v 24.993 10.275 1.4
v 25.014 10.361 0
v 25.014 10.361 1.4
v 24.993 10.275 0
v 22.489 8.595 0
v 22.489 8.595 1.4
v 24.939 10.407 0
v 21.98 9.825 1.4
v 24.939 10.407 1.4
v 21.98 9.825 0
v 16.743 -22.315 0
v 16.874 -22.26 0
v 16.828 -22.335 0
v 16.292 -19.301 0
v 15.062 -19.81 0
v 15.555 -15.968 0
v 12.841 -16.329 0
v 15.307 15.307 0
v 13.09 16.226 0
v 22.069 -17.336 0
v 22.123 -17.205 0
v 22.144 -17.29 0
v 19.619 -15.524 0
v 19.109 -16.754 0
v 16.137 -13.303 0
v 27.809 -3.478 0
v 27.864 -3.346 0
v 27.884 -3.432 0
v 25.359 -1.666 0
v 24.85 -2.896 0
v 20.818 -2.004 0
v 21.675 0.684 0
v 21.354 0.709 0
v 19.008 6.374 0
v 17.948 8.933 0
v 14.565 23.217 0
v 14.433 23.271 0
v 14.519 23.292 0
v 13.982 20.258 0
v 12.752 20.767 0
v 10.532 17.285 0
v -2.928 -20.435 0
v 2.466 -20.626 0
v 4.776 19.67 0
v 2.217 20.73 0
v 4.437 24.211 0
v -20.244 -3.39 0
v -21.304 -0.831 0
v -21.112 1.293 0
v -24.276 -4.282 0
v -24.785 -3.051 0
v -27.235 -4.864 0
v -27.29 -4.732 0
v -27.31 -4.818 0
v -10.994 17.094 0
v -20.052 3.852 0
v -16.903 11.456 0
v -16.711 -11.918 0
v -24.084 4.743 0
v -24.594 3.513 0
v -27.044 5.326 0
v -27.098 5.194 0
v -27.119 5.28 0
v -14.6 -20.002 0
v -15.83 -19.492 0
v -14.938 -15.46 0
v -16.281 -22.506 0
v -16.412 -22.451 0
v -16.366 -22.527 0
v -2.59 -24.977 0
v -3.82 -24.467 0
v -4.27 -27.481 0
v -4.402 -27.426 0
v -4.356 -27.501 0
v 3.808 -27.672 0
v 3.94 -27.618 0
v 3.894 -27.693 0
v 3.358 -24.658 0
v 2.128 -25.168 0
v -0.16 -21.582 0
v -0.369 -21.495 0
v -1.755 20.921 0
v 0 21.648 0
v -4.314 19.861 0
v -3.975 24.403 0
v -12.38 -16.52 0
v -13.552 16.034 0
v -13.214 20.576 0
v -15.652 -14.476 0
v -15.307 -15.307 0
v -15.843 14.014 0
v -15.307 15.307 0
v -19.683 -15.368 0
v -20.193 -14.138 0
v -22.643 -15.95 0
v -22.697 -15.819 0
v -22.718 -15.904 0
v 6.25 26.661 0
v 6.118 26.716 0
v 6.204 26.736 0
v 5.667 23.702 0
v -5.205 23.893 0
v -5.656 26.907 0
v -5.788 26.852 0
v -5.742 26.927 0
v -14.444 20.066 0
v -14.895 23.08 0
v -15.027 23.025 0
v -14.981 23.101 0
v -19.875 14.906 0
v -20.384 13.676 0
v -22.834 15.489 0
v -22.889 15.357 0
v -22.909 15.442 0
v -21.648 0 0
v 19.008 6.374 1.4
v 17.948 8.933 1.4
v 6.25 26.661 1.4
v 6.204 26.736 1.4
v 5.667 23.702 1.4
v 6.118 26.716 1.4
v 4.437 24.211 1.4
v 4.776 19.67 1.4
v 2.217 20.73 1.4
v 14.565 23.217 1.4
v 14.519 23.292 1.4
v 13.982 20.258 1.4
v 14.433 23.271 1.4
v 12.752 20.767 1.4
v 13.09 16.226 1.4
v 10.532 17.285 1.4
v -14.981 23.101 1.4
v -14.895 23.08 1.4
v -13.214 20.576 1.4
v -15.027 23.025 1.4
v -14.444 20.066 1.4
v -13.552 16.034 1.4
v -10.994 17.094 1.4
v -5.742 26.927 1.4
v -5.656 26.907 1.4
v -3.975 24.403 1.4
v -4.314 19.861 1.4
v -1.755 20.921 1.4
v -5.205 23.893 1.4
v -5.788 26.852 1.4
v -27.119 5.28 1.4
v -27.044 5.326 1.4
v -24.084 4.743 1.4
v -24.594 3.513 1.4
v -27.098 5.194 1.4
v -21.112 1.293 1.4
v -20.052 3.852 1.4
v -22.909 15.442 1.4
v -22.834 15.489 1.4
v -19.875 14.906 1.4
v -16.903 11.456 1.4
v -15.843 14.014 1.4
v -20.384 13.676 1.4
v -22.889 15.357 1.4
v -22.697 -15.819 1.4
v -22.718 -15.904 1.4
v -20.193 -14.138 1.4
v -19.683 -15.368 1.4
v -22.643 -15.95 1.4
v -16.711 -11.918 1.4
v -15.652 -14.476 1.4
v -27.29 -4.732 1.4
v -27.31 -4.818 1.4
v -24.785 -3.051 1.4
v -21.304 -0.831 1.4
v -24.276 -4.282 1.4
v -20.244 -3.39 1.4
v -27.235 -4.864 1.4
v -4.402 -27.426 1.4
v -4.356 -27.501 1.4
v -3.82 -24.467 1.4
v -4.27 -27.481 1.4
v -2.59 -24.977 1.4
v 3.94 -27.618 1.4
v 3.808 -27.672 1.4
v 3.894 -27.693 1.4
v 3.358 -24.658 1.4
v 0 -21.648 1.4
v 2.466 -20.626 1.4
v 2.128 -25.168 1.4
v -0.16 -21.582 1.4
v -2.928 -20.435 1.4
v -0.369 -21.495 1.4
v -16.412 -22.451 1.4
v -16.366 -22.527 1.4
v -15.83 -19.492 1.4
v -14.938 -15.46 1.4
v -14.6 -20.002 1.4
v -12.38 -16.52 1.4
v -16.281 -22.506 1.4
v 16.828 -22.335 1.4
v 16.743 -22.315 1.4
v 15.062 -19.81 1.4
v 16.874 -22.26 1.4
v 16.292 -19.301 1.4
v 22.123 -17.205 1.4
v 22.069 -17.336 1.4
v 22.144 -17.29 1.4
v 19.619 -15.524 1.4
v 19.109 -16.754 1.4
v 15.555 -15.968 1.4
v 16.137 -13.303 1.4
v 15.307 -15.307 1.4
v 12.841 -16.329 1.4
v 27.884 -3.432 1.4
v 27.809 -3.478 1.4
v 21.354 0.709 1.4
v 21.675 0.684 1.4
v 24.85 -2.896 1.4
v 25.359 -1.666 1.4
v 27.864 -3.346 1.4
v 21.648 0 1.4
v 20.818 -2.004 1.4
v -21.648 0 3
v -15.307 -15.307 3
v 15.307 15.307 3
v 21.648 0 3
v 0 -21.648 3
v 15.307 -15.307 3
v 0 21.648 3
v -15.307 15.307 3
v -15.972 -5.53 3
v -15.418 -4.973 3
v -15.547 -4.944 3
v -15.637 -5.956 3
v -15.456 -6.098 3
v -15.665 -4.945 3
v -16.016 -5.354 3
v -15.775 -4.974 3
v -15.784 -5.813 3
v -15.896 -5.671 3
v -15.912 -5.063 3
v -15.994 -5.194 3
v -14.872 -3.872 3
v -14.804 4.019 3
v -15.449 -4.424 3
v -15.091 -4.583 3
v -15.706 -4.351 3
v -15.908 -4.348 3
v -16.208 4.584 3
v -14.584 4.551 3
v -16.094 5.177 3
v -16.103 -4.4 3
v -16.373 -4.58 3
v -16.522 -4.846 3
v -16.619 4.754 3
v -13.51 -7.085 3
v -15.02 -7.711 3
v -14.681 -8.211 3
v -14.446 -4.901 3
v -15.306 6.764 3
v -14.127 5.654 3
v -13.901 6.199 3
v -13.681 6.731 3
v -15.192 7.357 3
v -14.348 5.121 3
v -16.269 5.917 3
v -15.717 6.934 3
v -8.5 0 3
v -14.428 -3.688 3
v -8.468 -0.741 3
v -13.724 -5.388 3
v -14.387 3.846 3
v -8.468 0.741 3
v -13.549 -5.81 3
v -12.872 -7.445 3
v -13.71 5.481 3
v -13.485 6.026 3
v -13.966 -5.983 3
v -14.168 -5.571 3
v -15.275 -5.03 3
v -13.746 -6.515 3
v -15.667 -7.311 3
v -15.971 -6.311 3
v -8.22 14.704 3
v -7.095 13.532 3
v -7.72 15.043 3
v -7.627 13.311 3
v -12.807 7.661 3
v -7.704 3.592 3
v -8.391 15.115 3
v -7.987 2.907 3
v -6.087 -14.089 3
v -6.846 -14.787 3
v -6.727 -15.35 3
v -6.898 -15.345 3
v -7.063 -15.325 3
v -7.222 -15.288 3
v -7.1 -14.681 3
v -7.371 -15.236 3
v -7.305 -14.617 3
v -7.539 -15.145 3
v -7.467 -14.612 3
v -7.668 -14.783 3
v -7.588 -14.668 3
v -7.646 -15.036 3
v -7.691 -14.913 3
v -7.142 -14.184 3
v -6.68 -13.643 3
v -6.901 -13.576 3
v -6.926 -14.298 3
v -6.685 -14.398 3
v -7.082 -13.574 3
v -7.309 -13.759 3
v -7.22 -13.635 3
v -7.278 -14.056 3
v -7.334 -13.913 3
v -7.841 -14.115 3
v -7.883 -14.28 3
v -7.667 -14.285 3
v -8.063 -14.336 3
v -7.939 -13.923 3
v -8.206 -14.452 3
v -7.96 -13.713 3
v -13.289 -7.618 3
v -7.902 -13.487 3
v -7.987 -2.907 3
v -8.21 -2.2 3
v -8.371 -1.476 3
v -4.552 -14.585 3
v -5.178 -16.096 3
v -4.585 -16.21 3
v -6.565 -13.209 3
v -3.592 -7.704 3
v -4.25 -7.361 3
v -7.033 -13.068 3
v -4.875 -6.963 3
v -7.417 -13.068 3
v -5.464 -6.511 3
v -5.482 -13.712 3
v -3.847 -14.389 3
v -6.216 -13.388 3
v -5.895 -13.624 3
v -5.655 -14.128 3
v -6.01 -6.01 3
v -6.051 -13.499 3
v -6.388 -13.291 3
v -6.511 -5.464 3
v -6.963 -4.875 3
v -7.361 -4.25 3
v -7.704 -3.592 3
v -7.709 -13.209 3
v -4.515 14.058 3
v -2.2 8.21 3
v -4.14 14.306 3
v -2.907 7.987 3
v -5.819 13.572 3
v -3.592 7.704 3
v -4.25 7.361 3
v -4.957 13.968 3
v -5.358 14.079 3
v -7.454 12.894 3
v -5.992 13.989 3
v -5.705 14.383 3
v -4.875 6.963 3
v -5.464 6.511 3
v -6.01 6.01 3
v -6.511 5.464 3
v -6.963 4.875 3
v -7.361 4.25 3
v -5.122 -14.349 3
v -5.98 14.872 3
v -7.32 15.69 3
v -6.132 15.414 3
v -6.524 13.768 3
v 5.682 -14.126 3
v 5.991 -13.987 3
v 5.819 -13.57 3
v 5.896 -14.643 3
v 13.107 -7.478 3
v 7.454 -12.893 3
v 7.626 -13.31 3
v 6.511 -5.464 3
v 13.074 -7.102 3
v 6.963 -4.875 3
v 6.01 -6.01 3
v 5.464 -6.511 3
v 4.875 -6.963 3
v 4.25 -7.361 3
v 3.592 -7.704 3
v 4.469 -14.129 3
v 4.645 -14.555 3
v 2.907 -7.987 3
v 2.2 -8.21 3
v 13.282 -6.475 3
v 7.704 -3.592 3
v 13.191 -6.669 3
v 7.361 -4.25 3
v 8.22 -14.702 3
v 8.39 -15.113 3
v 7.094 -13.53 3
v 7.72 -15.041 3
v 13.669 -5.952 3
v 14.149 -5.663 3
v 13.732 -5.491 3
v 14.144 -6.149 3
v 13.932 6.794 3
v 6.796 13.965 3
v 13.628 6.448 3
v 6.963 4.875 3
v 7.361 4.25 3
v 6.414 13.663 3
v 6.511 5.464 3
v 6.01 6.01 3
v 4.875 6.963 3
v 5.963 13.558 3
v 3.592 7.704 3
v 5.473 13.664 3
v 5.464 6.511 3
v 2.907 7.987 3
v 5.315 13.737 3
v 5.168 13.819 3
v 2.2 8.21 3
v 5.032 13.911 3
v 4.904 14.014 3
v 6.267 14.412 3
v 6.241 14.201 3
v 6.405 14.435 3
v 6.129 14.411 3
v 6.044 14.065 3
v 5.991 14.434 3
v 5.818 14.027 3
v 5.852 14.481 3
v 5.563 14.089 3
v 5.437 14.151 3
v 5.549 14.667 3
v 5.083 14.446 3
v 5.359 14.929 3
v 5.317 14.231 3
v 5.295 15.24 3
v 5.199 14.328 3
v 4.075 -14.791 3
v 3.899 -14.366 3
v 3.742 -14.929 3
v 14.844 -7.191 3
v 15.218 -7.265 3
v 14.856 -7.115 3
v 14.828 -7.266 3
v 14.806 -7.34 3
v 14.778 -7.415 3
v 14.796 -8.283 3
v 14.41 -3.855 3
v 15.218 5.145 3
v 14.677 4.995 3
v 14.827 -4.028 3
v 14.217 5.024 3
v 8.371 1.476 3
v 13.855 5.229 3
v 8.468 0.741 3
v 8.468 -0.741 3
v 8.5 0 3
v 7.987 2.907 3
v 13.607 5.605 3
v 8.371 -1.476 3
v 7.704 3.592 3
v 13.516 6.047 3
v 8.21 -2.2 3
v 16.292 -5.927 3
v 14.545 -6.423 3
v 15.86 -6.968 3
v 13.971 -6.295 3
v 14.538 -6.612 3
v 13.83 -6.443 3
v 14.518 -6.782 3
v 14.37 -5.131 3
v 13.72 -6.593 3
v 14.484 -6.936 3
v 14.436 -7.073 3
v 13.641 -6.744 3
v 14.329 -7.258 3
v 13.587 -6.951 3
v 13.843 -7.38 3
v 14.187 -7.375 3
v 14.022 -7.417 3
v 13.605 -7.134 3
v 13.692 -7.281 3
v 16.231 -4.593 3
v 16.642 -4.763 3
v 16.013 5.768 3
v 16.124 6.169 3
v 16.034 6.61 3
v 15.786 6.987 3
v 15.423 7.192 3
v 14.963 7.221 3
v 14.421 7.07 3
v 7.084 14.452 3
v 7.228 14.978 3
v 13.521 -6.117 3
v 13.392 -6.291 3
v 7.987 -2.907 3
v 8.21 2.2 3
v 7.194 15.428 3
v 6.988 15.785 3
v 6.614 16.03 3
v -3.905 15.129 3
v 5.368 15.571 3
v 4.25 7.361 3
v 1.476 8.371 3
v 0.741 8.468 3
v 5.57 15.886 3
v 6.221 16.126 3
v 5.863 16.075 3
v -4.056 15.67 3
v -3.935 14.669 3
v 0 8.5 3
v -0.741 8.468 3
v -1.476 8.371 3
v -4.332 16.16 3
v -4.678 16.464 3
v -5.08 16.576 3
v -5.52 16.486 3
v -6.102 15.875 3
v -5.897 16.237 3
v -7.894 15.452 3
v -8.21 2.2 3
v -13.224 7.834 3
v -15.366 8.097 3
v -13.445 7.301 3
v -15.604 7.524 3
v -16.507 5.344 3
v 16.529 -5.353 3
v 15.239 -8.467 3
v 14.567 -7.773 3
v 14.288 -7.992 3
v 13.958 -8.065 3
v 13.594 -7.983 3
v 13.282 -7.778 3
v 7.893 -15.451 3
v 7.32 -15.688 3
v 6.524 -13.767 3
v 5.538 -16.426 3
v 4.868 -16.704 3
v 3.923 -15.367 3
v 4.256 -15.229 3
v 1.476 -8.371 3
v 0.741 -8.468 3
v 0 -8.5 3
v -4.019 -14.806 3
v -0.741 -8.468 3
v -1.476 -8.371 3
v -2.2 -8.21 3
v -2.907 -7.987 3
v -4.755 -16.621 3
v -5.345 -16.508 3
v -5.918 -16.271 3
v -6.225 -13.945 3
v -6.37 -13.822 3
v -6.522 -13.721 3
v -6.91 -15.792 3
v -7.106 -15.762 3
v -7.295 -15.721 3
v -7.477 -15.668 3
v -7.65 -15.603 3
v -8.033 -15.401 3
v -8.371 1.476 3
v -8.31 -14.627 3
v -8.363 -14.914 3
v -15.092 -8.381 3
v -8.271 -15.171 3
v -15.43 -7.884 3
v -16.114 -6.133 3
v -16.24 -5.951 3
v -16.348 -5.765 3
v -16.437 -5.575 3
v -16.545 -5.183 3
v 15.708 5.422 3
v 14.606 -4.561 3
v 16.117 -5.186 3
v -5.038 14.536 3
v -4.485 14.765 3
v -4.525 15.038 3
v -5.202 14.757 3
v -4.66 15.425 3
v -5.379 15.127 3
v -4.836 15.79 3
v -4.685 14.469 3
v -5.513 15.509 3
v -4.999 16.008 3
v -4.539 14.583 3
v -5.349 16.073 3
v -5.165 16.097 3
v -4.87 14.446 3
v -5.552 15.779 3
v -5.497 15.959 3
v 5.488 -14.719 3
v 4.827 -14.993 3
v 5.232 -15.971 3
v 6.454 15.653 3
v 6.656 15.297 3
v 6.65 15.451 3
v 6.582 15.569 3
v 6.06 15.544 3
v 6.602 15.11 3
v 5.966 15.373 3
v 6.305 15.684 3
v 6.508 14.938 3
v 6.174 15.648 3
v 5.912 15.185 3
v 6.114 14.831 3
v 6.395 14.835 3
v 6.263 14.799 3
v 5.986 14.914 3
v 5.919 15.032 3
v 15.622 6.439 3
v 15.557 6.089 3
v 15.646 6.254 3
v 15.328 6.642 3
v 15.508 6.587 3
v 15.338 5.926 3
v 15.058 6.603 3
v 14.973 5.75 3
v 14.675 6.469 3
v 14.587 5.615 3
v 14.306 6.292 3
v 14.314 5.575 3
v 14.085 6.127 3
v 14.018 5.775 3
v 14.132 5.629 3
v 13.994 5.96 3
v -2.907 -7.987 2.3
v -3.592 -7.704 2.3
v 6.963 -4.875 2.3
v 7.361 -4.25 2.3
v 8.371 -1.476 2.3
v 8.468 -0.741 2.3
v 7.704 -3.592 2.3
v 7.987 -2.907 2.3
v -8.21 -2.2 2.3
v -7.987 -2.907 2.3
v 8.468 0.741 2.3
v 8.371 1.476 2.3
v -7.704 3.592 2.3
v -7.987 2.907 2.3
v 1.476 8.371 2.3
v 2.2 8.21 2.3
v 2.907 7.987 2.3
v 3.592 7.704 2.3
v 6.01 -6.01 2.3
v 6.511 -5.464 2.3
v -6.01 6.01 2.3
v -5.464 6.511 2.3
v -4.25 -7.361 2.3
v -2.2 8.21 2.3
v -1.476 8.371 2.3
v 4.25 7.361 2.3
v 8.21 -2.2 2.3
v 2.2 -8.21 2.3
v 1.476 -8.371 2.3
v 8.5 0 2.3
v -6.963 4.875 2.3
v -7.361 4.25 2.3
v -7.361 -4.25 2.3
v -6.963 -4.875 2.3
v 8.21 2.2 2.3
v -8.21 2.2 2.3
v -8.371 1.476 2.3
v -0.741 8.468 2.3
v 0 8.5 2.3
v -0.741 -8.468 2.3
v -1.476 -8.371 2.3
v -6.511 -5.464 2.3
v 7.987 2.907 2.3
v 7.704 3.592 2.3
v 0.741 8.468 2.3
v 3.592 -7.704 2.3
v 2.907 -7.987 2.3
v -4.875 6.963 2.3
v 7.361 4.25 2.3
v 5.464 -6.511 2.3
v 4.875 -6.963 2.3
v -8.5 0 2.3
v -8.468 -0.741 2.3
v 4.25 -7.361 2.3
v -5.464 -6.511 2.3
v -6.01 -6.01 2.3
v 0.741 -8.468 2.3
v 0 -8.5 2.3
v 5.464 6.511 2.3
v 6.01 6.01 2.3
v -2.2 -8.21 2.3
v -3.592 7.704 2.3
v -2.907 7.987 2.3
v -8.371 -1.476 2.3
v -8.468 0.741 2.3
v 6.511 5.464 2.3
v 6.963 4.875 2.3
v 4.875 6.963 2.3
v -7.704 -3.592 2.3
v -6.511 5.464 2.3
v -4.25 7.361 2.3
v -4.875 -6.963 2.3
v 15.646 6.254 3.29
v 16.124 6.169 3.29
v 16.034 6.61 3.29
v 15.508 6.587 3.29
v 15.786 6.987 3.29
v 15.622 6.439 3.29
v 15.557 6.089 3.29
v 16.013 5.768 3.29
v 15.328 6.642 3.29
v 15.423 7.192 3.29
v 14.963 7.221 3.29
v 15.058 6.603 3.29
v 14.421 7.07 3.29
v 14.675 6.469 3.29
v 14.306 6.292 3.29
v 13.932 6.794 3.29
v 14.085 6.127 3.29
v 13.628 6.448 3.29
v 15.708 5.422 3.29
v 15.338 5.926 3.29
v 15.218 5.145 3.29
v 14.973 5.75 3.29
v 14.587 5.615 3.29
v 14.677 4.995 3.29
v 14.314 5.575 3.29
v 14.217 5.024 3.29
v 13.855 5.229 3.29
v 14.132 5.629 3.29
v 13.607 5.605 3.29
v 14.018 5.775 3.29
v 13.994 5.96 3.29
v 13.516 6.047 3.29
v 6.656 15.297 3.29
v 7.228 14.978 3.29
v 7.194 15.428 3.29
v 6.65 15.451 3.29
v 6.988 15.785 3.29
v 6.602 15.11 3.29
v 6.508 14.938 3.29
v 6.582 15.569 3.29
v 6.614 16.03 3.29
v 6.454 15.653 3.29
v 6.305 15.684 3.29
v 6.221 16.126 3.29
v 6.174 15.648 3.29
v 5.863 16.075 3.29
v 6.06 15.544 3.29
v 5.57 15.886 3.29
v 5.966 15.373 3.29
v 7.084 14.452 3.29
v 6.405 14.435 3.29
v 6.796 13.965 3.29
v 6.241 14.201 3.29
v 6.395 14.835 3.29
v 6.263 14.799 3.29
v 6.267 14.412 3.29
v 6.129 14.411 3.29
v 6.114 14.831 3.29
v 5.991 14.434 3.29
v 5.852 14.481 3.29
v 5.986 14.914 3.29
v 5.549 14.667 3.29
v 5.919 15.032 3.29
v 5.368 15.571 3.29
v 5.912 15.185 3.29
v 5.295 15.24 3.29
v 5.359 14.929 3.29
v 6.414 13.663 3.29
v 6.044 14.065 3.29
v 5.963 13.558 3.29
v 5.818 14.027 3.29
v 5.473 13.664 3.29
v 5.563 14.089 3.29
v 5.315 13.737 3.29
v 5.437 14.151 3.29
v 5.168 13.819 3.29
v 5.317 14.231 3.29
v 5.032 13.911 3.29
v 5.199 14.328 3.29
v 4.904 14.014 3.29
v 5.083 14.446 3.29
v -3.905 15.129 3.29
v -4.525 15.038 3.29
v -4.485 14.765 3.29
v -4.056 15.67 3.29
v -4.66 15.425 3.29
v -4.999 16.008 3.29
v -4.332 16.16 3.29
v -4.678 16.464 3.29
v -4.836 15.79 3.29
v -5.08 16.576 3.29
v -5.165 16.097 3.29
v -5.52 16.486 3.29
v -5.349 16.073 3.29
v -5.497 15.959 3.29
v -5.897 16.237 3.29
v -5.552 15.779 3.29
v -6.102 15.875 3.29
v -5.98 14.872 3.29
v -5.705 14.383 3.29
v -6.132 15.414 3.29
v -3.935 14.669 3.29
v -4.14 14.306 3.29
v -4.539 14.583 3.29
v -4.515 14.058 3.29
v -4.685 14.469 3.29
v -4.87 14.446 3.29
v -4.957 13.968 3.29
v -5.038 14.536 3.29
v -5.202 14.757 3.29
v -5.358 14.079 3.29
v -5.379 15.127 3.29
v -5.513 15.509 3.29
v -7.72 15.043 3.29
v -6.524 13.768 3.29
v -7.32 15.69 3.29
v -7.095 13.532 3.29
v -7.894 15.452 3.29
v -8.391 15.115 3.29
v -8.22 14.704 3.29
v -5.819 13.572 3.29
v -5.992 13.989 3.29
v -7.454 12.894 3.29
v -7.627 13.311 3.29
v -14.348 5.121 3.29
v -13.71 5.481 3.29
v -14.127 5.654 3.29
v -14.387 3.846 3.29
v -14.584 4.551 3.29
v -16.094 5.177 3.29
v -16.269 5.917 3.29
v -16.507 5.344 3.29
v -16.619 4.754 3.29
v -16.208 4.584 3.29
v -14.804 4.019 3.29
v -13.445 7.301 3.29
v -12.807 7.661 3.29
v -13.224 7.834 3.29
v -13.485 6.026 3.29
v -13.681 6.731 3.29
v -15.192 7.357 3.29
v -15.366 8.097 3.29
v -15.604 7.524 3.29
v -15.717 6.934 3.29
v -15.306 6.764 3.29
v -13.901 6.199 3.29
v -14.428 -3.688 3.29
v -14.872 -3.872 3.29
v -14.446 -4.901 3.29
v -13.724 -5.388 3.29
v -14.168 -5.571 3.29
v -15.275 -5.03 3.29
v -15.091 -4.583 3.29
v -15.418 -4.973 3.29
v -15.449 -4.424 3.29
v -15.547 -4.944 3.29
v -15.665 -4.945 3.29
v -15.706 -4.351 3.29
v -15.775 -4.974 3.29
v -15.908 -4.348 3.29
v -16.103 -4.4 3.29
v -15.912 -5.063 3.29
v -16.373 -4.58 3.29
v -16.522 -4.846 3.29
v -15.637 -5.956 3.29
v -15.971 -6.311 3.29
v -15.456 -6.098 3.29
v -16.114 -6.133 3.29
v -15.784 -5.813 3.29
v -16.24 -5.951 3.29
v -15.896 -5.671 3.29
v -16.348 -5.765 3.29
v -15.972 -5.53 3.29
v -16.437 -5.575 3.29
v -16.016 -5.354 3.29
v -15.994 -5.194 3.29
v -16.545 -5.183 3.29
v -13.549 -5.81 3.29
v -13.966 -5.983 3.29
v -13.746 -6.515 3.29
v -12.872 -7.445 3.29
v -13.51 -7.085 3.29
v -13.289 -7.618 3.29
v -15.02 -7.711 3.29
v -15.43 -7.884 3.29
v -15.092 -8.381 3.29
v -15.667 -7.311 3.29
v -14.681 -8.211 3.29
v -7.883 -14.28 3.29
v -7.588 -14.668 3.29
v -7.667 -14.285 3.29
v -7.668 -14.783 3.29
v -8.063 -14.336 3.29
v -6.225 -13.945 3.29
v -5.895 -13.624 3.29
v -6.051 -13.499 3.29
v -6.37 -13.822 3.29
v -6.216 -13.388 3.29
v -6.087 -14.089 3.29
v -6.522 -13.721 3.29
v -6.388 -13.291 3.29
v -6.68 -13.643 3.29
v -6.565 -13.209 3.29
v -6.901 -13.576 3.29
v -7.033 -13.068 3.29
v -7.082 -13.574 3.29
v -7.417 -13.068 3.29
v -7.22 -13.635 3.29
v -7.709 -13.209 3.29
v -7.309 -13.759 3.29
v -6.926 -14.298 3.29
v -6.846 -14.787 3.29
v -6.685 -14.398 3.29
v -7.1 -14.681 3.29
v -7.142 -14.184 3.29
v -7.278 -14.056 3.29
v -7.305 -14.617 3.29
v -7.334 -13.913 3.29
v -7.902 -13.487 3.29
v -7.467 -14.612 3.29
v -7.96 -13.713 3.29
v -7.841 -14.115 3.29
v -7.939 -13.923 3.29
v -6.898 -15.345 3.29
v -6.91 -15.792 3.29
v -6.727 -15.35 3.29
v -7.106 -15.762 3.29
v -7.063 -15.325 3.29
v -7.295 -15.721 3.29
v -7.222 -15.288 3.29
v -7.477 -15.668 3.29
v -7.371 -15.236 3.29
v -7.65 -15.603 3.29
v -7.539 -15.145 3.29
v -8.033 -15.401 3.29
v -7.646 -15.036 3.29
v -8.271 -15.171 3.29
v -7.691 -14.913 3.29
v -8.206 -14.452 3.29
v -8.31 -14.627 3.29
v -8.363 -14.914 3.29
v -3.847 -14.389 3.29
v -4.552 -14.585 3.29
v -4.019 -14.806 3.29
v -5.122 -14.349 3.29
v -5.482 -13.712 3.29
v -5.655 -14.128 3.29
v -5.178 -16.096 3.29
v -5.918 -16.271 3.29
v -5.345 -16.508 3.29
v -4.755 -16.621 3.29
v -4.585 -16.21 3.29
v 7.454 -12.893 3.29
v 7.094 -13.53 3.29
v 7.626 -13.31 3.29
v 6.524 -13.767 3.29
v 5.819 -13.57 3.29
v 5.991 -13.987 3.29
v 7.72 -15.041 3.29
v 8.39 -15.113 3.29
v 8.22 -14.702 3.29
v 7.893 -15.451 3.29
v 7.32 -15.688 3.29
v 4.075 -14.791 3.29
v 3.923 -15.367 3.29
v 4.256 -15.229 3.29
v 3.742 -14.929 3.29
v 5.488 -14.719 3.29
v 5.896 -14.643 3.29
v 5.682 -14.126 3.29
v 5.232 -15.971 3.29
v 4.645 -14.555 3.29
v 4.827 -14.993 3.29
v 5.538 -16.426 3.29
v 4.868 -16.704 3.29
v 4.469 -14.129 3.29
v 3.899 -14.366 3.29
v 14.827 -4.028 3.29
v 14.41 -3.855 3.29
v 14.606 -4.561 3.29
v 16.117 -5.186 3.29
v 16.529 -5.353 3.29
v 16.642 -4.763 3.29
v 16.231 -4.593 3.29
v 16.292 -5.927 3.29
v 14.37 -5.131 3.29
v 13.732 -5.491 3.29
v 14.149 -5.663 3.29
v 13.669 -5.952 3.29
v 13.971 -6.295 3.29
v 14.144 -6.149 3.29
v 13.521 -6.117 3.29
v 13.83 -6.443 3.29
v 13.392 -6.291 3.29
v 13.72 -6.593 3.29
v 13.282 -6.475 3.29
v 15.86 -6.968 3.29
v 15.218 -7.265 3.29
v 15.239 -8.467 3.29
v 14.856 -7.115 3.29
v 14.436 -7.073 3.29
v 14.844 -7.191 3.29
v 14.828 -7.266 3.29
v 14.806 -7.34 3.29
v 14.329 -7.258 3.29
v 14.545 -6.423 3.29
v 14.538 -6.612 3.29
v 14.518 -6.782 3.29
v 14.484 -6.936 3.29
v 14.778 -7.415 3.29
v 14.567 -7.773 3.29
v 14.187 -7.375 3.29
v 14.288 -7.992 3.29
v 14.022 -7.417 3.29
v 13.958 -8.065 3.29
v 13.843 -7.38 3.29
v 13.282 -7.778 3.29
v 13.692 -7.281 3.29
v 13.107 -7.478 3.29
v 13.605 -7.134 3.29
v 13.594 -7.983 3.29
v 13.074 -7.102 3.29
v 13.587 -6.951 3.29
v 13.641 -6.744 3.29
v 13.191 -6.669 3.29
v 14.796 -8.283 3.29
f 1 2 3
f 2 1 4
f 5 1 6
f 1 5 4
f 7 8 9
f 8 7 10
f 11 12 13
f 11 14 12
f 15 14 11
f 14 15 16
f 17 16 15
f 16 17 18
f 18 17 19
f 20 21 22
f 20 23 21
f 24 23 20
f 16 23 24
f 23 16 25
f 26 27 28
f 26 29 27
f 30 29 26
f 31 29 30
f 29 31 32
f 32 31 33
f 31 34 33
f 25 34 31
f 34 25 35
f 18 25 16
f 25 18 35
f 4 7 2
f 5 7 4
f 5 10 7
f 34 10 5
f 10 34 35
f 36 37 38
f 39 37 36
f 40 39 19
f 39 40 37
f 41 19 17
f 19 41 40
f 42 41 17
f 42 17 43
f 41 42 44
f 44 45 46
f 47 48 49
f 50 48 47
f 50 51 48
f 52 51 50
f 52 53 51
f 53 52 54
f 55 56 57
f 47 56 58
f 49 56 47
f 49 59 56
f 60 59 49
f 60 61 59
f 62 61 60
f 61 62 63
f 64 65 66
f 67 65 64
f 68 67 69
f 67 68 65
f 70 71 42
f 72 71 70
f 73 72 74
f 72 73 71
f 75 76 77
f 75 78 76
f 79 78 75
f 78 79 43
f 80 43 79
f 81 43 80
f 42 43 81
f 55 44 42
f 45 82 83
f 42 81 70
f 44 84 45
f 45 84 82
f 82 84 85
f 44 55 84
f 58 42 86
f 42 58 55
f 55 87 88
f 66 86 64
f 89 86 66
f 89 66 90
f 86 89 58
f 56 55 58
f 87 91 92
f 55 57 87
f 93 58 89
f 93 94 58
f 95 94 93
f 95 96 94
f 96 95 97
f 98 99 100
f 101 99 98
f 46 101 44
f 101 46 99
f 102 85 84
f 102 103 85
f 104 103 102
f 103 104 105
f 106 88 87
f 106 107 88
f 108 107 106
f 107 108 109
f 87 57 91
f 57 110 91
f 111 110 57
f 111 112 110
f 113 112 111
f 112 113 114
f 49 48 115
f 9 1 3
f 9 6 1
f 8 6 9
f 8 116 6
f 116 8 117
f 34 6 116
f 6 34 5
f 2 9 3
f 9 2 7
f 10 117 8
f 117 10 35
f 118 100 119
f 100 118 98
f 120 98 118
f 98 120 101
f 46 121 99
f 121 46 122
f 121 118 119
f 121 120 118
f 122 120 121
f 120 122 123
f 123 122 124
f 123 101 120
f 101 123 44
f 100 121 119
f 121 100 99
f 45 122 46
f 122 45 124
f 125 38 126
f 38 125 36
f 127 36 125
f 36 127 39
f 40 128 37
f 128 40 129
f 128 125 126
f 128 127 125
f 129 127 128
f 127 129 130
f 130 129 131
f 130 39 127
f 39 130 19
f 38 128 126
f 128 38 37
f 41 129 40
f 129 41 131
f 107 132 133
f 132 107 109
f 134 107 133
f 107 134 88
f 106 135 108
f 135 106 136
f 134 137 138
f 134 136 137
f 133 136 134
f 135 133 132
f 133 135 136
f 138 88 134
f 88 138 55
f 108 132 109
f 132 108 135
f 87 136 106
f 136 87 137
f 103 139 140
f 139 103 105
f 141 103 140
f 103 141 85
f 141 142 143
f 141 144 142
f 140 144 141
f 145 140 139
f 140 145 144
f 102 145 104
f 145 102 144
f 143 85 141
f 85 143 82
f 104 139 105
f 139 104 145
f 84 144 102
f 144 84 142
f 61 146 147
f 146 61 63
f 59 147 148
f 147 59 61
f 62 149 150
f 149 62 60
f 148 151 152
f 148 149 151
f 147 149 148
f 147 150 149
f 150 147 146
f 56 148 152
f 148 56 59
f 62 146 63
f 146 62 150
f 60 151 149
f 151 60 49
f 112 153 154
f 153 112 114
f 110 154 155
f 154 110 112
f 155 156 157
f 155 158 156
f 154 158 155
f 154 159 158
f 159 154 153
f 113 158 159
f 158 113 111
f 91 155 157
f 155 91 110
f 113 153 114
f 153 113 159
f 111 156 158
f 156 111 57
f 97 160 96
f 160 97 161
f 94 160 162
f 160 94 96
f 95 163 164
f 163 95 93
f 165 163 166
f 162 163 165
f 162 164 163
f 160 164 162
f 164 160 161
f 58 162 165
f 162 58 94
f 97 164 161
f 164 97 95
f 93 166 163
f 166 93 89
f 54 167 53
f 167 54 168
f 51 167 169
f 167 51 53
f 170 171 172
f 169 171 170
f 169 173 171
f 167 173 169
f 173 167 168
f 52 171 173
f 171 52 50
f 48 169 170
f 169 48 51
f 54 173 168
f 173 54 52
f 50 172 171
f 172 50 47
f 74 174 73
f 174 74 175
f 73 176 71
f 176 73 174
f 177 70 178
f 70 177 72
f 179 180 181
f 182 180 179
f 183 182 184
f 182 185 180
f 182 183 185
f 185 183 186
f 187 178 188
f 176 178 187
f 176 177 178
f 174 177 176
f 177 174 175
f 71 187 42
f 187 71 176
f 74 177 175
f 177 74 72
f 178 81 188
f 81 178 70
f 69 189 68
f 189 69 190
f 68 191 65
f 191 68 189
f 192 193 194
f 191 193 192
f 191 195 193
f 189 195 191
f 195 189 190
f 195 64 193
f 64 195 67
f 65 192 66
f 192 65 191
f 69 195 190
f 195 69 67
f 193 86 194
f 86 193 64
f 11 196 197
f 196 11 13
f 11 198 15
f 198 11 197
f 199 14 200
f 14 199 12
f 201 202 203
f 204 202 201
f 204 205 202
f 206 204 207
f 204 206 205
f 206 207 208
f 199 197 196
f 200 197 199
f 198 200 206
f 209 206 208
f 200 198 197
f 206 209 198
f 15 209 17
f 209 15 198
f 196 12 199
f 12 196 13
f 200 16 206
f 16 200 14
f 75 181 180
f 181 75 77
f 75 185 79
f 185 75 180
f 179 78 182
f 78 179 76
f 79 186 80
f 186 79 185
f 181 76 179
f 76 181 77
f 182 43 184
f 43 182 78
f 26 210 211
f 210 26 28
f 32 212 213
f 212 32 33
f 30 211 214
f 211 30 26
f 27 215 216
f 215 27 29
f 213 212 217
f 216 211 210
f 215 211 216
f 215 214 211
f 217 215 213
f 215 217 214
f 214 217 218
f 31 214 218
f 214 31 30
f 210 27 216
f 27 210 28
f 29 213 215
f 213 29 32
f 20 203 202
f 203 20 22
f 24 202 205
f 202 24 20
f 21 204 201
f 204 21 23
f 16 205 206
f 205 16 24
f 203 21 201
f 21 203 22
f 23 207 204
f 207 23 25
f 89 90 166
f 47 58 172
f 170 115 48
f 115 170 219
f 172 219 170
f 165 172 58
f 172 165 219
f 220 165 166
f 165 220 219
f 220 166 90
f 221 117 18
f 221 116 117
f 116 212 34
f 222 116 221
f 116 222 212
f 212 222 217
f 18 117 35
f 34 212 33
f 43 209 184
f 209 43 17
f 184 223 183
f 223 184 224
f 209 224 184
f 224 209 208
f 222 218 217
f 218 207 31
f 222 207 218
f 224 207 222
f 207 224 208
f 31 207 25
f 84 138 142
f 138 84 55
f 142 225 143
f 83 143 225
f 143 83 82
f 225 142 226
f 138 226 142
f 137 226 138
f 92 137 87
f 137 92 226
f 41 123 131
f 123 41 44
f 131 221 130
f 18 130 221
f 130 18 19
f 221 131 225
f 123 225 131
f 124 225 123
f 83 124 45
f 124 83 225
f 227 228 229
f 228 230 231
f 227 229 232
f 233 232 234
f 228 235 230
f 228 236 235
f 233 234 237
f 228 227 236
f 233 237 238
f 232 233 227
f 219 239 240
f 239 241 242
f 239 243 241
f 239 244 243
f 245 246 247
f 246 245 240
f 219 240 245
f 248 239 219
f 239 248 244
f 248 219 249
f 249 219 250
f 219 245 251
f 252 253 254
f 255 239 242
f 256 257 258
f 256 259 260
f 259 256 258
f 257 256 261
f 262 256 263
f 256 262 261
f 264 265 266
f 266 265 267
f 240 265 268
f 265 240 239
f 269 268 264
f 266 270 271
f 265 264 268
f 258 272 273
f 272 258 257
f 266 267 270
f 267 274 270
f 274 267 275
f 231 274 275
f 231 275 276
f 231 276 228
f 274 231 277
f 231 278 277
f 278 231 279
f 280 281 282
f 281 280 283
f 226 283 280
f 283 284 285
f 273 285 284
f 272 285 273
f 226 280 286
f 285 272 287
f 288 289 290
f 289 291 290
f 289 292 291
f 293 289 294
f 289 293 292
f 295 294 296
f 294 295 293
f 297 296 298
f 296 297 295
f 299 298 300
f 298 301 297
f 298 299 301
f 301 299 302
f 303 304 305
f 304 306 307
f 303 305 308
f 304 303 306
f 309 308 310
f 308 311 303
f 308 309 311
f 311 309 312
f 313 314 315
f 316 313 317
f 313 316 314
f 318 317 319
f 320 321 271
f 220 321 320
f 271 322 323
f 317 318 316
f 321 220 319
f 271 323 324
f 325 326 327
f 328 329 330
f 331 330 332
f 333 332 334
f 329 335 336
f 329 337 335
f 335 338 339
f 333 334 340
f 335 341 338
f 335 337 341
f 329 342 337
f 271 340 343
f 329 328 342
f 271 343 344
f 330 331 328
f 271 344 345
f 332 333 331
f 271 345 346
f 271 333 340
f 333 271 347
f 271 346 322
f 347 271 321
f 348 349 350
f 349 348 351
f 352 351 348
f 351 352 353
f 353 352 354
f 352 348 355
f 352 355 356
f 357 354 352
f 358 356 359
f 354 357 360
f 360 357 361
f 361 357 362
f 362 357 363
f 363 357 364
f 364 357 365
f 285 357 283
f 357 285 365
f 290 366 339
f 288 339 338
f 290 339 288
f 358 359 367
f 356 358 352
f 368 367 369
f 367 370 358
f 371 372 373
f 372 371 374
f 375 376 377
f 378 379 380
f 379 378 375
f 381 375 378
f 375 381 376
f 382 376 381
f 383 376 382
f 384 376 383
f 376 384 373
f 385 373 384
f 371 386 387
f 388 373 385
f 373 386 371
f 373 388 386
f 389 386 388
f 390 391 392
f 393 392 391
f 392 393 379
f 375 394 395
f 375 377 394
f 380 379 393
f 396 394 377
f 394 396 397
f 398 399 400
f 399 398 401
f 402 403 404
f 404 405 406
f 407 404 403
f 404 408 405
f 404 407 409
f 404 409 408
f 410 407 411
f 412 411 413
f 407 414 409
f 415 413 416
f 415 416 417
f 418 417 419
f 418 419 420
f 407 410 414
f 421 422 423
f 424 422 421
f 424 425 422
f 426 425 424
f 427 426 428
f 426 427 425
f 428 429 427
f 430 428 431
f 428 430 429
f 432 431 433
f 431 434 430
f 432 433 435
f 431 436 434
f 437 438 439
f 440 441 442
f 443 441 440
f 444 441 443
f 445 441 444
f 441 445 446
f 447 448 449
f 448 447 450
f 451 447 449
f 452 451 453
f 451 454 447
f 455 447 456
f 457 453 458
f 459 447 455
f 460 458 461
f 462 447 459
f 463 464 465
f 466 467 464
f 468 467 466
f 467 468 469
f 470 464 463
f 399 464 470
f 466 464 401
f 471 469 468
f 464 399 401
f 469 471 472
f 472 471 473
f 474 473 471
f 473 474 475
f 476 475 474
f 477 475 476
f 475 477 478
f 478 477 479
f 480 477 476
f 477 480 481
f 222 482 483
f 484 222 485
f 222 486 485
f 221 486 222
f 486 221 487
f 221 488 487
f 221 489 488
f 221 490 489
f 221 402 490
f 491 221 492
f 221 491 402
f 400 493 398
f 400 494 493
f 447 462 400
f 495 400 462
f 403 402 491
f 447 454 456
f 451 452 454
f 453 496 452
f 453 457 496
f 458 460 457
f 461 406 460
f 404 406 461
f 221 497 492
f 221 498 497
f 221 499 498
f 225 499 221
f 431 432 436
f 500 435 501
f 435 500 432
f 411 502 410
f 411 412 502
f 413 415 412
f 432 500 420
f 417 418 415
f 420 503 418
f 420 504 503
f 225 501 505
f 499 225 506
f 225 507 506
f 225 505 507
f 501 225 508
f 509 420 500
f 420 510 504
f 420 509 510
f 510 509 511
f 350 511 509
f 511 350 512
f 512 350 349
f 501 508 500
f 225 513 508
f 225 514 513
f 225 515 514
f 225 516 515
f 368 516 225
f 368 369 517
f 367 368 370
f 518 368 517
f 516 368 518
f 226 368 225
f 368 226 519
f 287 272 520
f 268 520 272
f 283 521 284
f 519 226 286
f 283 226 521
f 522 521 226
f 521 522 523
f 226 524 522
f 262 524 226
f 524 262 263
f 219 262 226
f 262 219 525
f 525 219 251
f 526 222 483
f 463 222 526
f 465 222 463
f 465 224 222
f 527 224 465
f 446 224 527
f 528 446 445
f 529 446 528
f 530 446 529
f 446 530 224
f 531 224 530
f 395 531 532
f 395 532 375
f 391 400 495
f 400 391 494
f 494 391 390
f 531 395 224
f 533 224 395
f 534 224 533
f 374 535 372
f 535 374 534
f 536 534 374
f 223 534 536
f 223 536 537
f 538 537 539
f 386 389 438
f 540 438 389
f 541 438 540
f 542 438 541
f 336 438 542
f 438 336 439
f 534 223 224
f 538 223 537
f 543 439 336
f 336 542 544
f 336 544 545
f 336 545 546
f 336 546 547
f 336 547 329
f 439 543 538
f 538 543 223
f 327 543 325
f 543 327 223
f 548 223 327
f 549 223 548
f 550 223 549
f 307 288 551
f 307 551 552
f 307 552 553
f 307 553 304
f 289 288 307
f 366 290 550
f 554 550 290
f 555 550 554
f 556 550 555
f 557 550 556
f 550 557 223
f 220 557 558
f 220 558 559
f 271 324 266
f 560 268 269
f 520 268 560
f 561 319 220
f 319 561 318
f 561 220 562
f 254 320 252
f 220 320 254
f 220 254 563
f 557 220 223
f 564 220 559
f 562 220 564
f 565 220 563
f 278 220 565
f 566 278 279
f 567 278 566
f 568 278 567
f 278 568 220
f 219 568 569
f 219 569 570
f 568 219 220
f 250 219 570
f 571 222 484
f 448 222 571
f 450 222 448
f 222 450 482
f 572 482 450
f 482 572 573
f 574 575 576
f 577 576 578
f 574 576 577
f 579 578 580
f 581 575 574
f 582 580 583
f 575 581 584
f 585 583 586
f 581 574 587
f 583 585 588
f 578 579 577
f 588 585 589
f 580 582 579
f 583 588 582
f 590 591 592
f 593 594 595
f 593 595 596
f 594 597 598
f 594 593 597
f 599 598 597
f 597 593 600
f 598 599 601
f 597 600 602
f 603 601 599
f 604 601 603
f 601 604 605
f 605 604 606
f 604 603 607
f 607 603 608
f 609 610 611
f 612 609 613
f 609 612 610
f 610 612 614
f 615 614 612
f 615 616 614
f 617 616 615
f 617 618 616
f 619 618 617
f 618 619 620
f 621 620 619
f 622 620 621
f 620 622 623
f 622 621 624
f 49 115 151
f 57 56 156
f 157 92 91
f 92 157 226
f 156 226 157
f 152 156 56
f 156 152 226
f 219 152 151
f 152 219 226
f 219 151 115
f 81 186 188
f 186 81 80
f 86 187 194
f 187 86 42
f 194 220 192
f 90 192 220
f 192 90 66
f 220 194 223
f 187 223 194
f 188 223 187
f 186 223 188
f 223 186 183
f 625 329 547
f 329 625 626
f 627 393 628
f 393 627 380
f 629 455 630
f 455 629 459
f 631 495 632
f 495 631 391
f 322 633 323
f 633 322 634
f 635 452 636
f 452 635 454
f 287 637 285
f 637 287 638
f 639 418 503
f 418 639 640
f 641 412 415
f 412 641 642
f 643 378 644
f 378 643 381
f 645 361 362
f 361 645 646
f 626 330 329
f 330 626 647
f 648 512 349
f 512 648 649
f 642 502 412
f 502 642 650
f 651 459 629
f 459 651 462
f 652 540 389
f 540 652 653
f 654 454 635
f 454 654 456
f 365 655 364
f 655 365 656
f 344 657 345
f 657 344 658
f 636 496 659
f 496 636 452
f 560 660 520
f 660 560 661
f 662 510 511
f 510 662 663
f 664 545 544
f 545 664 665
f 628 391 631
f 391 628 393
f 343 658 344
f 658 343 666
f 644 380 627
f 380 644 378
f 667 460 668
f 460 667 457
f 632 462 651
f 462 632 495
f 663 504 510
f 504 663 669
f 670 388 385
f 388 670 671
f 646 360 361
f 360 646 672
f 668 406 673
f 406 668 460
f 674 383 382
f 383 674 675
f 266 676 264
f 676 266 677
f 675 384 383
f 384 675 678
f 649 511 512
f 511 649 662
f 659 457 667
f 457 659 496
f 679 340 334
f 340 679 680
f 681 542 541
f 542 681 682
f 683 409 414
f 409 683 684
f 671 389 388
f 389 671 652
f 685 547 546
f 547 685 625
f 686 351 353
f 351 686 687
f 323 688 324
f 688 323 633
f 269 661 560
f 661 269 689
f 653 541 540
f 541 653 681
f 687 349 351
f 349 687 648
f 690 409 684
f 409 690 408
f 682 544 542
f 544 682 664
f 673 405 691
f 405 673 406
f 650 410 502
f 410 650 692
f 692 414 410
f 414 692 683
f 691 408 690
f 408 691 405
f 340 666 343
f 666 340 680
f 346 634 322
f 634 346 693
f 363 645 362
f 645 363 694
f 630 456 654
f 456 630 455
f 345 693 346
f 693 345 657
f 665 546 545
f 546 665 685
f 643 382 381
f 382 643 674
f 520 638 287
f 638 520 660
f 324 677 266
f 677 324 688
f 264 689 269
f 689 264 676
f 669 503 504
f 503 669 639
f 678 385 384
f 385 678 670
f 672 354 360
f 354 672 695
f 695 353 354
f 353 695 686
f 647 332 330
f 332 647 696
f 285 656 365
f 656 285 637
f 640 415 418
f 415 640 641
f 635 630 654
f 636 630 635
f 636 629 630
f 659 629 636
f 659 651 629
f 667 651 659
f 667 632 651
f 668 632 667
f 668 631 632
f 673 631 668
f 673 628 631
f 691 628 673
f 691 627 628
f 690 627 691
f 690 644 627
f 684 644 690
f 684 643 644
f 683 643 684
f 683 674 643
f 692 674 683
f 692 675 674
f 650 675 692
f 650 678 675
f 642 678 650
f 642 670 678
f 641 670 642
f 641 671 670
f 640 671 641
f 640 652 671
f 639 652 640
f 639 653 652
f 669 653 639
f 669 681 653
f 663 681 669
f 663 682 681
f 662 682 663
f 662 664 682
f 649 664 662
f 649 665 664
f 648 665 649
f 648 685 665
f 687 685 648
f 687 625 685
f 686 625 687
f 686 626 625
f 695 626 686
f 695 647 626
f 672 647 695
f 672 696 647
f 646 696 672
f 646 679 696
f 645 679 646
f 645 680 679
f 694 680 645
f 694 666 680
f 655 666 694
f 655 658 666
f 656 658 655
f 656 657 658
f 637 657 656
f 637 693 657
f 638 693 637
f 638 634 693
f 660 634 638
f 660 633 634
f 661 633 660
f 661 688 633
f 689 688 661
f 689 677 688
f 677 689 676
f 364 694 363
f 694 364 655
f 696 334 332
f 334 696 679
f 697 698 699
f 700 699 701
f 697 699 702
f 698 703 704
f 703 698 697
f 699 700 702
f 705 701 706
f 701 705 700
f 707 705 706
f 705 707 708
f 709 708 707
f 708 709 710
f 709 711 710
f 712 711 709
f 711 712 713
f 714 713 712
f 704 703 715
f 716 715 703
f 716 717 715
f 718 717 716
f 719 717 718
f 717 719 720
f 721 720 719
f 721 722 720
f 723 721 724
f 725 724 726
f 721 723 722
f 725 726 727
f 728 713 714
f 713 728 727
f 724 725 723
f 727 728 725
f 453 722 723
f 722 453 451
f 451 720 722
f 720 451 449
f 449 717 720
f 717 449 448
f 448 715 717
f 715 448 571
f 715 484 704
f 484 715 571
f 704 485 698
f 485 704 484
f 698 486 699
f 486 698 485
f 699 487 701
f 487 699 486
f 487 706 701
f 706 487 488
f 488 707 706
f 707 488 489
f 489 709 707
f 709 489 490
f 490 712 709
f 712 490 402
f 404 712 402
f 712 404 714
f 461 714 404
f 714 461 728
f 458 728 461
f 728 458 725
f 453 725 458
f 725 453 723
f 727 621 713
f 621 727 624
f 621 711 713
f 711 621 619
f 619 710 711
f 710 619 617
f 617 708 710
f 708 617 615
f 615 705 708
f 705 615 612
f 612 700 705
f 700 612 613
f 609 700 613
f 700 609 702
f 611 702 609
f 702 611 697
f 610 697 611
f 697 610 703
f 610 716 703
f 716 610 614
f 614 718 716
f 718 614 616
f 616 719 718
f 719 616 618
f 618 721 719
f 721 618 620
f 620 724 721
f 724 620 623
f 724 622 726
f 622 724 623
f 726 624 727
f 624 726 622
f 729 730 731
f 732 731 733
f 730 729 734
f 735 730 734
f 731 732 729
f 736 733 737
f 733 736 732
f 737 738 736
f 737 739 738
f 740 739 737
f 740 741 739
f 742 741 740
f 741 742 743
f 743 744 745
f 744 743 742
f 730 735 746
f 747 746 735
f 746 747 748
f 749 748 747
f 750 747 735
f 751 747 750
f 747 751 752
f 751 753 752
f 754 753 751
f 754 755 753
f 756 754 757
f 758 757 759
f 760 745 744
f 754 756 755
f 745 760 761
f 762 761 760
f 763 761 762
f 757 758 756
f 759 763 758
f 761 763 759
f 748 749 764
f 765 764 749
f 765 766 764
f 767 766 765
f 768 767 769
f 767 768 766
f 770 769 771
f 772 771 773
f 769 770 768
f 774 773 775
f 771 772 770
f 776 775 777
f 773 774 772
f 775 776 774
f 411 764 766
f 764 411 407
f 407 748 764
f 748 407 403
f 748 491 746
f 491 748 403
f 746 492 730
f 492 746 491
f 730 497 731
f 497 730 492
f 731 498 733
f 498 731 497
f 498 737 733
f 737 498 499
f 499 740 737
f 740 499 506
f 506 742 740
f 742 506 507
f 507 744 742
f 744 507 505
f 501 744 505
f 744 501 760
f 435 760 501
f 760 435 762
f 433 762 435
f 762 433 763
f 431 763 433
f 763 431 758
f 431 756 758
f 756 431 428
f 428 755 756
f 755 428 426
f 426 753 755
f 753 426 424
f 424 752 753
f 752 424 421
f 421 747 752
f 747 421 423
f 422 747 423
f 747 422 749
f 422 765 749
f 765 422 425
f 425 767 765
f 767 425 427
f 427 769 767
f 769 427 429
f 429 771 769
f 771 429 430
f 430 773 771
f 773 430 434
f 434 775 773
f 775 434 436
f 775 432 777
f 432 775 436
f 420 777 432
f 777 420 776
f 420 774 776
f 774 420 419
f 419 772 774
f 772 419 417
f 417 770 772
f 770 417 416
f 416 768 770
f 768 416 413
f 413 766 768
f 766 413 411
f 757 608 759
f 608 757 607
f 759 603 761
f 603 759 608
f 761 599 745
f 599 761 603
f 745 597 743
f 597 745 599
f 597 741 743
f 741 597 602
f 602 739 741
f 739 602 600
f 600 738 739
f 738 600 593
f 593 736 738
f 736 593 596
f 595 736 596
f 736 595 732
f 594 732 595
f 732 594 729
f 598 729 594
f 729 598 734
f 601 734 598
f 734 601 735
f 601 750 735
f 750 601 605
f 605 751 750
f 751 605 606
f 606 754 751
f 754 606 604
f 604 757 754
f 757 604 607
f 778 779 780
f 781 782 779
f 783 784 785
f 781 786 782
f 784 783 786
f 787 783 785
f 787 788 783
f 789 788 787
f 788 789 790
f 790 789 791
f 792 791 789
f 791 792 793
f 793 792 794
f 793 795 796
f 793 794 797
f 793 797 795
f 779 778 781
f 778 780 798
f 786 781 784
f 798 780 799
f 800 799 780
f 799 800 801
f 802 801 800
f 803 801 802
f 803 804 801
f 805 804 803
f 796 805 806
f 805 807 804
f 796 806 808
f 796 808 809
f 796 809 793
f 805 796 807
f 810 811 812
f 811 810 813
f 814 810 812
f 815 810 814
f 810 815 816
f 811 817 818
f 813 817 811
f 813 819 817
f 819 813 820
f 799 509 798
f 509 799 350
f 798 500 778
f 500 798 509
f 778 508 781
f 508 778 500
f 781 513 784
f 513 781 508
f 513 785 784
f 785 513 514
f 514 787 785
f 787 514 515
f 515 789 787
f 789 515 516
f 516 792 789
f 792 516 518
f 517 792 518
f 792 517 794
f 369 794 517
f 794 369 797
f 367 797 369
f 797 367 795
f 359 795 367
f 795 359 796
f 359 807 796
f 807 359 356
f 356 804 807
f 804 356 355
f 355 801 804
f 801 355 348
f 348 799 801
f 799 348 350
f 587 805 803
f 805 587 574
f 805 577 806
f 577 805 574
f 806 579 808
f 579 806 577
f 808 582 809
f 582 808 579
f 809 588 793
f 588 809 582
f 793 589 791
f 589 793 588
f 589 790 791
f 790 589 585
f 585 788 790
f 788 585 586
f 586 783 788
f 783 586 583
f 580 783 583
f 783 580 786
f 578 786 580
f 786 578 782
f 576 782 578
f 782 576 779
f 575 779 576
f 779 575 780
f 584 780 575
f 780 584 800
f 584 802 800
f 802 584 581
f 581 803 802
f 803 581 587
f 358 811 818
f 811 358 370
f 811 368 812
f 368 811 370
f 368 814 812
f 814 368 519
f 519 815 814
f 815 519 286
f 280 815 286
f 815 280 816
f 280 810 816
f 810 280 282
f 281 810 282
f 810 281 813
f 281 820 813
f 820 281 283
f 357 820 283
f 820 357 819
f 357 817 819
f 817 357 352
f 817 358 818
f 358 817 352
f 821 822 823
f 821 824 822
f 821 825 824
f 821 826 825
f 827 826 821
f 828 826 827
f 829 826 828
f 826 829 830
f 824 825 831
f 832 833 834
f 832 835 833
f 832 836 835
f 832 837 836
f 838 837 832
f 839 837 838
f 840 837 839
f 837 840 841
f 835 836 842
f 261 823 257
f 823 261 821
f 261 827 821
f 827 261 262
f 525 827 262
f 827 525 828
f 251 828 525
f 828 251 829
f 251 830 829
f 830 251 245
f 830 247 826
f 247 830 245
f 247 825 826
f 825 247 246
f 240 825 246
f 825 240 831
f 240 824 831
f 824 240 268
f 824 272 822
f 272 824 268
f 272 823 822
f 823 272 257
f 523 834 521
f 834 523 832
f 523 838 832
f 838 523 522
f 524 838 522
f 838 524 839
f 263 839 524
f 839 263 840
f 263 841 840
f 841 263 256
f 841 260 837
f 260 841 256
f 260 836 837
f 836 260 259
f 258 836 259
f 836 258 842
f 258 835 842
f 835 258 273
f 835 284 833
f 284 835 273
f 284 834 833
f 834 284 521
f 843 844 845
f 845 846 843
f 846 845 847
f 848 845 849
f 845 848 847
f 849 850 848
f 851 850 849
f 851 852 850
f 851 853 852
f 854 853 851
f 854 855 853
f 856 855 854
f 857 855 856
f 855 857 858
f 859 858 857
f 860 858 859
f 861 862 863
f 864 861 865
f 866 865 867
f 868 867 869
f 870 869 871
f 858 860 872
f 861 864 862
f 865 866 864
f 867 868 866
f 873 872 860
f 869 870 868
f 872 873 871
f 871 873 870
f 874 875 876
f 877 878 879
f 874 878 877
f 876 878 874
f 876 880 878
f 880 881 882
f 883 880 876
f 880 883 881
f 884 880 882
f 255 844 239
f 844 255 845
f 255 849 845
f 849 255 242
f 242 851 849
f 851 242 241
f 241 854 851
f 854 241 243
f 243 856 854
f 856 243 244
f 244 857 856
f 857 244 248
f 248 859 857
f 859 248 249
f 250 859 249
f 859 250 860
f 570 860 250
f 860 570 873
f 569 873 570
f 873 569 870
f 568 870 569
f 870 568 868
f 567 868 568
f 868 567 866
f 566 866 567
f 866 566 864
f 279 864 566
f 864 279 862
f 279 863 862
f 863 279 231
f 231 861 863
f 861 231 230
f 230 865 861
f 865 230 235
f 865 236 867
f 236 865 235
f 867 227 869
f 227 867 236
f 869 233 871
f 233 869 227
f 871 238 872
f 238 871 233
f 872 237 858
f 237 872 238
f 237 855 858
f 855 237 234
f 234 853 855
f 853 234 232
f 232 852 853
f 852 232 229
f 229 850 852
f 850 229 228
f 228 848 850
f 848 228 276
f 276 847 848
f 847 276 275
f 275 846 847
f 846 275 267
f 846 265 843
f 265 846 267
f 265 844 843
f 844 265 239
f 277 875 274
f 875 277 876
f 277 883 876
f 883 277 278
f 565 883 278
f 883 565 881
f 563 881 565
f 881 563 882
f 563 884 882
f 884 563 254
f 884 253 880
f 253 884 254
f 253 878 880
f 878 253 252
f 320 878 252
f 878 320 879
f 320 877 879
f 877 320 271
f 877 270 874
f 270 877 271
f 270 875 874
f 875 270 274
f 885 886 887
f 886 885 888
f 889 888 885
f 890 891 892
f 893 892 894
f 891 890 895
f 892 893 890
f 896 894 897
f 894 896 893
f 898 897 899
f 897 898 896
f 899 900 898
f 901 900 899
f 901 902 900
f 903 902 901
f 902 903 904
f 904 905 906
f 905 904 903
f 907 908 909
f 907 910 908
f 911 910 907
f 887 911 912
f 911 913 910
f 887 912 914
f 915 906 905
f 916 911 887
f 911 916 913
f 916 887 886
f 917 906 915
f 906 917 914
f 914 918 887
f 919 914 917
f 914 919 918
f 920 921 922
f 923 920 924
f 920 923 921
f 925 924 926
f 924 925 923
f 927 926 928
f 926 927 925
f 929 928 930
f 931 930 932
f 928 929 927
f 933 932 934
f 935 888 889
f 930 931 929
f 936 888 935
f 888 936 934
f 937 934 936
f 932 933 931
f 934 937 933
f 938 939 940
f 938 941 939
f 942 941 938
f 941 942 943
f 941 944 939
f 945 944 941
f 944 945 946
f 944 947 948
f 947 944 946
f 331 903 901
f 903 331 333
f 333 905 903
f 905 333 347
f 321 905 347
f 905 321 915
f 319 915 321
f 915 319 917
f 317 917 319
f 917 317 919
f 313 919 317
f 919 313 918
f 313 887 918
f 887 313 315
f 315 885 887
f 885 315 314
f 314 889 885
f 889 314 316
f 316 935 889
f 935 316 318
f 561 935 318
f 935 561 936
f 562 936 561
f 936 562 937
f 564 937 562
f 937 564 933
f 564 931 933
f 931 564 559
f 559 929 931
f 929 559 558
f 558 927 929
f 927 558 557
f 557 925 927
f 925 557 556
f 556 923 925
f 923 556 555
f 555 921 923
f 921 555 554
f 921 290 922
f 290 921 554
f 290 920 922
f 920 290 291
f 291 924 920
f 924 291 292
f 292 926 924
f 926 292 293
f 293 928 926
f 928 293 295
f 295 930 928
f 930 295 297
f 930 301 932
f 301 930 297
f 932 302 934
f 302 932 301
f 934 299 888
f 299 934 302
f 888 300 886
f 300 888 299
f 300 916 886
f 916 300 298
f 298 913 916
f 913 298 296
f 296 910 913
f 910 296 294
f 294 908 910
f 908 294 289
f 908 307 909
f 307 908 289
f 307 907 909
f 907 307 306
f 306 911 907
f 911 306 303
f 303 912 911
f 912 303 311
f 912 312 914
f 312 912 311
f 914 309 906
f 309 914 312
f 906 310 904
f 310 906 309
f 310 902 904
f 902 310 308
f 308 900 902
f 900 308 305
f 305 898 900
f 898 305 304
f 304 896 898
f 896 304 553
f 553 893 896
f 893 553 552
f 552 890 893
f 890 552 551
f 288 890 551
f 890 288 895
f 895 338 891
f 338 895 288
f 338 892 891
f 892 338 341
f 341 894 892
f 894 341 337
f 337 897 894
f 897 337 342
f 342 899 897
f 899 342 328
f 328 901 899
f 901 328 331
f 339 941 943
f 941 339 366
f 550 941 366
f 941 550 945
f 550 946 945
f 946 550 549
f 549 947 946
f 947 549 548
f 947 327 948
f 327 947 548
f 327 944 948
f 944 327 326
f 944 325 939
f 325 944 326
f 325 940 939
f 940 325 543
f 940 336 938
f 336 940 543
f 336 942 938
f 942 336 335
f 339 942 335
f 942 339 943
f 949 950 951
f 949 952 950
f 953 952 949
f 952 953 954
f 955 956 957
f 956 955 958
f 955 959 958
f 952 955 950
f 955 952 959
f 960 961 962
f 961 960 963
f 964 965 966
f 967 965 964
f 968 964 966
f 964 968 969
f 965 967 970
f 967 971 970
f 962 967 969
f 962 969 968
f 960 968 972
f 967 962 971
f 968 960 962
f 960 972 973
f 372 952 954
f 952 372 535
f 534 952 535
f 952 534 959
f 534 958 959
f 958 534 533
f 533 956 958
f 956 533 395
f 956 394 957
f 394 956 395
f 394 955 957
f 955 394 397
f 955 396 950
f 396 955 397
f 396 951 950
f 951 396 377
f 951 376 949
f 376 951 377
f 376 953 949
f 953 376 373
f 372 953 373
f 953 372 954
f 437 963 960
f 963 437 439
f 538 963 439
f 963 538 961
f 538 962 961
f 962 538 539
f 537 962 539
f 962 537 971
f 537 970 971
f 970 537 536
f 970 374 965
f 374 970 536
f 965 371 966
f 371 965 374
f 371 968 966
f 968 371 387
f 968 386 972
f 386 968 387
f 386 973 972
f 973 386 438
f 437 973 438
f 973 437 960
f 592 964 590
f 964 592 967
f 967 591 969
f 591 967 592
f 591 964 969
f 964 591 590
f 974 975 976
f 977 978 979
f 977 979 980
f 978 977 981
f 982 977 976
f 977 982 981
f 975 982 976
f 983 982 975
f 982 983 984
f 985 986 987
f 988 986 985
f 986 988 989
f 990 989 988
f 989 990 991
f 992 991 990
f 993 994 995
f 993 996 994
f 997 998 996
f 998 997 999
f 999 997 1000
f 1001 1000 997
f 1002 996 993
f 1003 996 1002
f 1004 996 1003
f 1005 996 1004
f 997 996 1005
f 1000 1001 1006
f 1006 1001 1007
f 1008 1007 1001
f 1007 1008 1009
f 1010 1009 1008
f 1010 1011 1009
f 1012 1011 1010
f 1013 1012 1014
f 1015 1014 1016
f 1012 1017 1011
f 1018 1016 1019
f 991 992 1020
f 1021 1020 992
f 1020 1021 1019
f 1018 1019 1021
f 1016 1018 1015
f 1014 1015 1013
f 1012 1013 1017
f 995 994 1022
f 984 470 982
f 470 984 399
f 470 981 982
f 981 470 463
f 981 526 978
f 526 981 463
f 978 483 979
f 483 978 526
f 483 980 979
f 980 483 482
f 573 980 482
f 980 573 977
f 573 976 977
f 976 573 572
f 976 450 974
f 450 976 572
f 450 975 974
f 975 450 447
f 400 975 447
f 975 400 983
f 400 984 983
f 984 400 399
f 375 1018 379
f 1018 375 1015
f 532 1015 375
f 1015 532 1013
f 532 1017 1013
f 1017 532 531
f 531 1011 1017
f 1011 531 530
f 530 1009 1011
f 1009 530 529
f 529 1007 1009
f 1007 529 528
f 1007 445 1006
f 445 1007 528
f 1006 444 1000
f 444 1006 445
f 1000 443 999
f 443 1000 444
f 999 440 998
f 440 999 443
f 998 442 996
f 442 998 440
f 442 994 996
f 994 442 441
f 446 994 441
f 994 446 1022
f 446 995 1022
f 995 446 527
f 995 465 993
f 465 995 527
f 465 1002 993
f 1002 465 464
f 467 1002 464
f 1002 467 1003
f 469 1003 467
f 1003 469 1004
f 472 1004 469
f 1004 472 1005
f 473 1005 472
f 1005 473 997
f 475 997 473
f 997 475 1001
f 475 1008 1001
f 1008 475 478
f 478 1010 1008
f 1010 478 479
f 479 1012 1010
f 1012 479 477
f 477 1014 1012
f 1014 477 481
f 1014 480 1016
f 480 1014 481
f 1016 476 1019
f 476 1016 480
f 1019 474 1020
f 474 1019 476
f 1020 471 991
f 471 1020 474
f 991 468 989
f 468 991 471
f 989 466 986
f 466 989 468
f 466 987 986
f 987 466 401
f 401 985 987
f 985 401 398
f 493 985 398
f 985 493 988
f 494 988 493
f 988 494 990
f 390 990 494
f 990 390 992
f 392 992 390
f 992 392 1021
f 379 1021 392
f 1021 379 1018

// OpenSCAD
// 2-Point Discrimination Wheel — parametric n-gon, COUNTERclockwise order + split thickness

distances_mm       = is_undef(distances_mm) ? [0,9,10,11,12,13,14,15] : distances_mm;

// --- geometry ---
outer_flat_to_flat = is_undef(outer_flat_to_flat) ? 40 : outer_flat_to_flat;
body_thickness     = is_undef(body_thickness) ? 3 : body_thickness;   // <-- NEW: octagon thickness
prong_thickness    = is_undef(prong_thickness) ? 1.4 : prong_thickness; // <-- NEW: prong thickness

spike_length  = is_undef(spike_length) ? 7 : spike_length;
base_d        = is_undef(base_d) ? 3 : base_d;
shank_d       = is_undef(shank_d) ? 1.4 : shank_d;
tip_d         = is_undef(tip_d) ? 0.15 : tip_d;
root_overlap  = is_undef(root_overlap) ? .7 : root_overlap;

// --- labels / hub ---
label_size    = is_undef(label_size) ? 2.5 : label_size;
label_depth   = is_undef(label_depth) ? .3 : label_depth;
font_name     = is_undef(font_name) ? "DejaVu Sans:style=Bold" : font_name;
label_radial  = is_undef(label_radial) ? 0.80 : label_radial;
hub_diameter  = is_undef(hub_diameter) ? 17 : hub_diameter;
thumb_depth   = is_undef(thumb_depth) ? .7 : thumb_depth;

// optional (you weren’t actually applying it anywhere)
chamfer = is_undef(chamfer) ? 0.8 : chamfer;
$fn = is_undef($fn) ? 72 : $fn;

function apothem(across_flats,n)=across_flats/2;
function circ_radius(across_flats,n)=across_flats/(2*cos(180/n));

// Use BODY thickness for anything “top referenced”
function total_thickness()=body_thickness + max(chamfer,0);

module polygon_plate(n, across_flats, thk){
  r = circ_radius(across_flats,n);
  linear_extrude(thk)
    polygon(points=[for(i=[0:n-1]) let(a=360*i/n)[r*cos(a), r*sin(a)]]);
}

module spike_single_flat(len=spike_length,bd=base_d,sd=shank_d,td=tip_d){
  base_r=bd/2; shank_r=sd/2; tip_r=td/2;
  bx=-root_overlap; sx=len*0.55; tx=len;

  // <-- prongs extrude ONLY prong_thickness (still from z=0 up)
  linear_extrude(height=prong_thickness)
  union(){
    translate([bx,0]) circle(r=base_r);
    hull(){translate([bx,0])circle(r=base_r);translate([sx,0])circle(r=shank_r);}
    hull(){translate([sx,0])circle(r=shank_r);translate([tx,0])circle(r=tip_r);}
  }
}

module thumb_well_top(){
  // Subtract well from TOP of the BODY (not the prongs)
  translate([0,0,body_thickness - thumb_depth])
    cylinder(h=thumb_depth,d=hub_diameter,$fn=72);
}

module edge_numbers_top(distances,a){
  n=len(distances);
  for(i=[0:n-1]){
    // <-- COUNTERclockwise progression (positive angle)
    angN=+360*(i+0.5)/n;

    translate([(label_radial*a)*cos(angN),
               (label_radial*a)*sin(angN),
               body_thickness - 0.01])
      rotate([0,0,angN-90])
        linear_extrude(height=label_depth)
          text(str(distances[i]),
               size=label_size,font=font_name,
               halign="center",valign="center");
  }
}

module wheel_solid(distances){
  n=len(distances);
  a=apothem(outer_flat_to_flat,n);

  union(){
    // <-- body uses body_thickness
    polygon_plate(n,outer_flat_to_flat,body_thickness);

    for(i=[0:n-1]){
      // <-- COUNTERclockwise progression (positive angle)
      angN=+360*(i+0.5)/n;

      translate([a*cos(angN),a*sin(angN),0])
        rotate([0,0,angN]){
          sep=distances[i];
          translate([0,+sep/2,0]) spike_single_flat();
          translate([0,-sep/2,0]) spike_single_flat();
        }
    }
  }
}

module discriminator(distances){
  n=len(distances);
  assert(n>=3,"distances_mm must have at least 3 entries.");

  union(){
    difference(){
      wheel_solid(distances);
      thumb_well_top();
    }
    edge_numbers_top(distances, apothem(outer_flat_to_flat,n));
  }
}

discriminator(distances_mm);
